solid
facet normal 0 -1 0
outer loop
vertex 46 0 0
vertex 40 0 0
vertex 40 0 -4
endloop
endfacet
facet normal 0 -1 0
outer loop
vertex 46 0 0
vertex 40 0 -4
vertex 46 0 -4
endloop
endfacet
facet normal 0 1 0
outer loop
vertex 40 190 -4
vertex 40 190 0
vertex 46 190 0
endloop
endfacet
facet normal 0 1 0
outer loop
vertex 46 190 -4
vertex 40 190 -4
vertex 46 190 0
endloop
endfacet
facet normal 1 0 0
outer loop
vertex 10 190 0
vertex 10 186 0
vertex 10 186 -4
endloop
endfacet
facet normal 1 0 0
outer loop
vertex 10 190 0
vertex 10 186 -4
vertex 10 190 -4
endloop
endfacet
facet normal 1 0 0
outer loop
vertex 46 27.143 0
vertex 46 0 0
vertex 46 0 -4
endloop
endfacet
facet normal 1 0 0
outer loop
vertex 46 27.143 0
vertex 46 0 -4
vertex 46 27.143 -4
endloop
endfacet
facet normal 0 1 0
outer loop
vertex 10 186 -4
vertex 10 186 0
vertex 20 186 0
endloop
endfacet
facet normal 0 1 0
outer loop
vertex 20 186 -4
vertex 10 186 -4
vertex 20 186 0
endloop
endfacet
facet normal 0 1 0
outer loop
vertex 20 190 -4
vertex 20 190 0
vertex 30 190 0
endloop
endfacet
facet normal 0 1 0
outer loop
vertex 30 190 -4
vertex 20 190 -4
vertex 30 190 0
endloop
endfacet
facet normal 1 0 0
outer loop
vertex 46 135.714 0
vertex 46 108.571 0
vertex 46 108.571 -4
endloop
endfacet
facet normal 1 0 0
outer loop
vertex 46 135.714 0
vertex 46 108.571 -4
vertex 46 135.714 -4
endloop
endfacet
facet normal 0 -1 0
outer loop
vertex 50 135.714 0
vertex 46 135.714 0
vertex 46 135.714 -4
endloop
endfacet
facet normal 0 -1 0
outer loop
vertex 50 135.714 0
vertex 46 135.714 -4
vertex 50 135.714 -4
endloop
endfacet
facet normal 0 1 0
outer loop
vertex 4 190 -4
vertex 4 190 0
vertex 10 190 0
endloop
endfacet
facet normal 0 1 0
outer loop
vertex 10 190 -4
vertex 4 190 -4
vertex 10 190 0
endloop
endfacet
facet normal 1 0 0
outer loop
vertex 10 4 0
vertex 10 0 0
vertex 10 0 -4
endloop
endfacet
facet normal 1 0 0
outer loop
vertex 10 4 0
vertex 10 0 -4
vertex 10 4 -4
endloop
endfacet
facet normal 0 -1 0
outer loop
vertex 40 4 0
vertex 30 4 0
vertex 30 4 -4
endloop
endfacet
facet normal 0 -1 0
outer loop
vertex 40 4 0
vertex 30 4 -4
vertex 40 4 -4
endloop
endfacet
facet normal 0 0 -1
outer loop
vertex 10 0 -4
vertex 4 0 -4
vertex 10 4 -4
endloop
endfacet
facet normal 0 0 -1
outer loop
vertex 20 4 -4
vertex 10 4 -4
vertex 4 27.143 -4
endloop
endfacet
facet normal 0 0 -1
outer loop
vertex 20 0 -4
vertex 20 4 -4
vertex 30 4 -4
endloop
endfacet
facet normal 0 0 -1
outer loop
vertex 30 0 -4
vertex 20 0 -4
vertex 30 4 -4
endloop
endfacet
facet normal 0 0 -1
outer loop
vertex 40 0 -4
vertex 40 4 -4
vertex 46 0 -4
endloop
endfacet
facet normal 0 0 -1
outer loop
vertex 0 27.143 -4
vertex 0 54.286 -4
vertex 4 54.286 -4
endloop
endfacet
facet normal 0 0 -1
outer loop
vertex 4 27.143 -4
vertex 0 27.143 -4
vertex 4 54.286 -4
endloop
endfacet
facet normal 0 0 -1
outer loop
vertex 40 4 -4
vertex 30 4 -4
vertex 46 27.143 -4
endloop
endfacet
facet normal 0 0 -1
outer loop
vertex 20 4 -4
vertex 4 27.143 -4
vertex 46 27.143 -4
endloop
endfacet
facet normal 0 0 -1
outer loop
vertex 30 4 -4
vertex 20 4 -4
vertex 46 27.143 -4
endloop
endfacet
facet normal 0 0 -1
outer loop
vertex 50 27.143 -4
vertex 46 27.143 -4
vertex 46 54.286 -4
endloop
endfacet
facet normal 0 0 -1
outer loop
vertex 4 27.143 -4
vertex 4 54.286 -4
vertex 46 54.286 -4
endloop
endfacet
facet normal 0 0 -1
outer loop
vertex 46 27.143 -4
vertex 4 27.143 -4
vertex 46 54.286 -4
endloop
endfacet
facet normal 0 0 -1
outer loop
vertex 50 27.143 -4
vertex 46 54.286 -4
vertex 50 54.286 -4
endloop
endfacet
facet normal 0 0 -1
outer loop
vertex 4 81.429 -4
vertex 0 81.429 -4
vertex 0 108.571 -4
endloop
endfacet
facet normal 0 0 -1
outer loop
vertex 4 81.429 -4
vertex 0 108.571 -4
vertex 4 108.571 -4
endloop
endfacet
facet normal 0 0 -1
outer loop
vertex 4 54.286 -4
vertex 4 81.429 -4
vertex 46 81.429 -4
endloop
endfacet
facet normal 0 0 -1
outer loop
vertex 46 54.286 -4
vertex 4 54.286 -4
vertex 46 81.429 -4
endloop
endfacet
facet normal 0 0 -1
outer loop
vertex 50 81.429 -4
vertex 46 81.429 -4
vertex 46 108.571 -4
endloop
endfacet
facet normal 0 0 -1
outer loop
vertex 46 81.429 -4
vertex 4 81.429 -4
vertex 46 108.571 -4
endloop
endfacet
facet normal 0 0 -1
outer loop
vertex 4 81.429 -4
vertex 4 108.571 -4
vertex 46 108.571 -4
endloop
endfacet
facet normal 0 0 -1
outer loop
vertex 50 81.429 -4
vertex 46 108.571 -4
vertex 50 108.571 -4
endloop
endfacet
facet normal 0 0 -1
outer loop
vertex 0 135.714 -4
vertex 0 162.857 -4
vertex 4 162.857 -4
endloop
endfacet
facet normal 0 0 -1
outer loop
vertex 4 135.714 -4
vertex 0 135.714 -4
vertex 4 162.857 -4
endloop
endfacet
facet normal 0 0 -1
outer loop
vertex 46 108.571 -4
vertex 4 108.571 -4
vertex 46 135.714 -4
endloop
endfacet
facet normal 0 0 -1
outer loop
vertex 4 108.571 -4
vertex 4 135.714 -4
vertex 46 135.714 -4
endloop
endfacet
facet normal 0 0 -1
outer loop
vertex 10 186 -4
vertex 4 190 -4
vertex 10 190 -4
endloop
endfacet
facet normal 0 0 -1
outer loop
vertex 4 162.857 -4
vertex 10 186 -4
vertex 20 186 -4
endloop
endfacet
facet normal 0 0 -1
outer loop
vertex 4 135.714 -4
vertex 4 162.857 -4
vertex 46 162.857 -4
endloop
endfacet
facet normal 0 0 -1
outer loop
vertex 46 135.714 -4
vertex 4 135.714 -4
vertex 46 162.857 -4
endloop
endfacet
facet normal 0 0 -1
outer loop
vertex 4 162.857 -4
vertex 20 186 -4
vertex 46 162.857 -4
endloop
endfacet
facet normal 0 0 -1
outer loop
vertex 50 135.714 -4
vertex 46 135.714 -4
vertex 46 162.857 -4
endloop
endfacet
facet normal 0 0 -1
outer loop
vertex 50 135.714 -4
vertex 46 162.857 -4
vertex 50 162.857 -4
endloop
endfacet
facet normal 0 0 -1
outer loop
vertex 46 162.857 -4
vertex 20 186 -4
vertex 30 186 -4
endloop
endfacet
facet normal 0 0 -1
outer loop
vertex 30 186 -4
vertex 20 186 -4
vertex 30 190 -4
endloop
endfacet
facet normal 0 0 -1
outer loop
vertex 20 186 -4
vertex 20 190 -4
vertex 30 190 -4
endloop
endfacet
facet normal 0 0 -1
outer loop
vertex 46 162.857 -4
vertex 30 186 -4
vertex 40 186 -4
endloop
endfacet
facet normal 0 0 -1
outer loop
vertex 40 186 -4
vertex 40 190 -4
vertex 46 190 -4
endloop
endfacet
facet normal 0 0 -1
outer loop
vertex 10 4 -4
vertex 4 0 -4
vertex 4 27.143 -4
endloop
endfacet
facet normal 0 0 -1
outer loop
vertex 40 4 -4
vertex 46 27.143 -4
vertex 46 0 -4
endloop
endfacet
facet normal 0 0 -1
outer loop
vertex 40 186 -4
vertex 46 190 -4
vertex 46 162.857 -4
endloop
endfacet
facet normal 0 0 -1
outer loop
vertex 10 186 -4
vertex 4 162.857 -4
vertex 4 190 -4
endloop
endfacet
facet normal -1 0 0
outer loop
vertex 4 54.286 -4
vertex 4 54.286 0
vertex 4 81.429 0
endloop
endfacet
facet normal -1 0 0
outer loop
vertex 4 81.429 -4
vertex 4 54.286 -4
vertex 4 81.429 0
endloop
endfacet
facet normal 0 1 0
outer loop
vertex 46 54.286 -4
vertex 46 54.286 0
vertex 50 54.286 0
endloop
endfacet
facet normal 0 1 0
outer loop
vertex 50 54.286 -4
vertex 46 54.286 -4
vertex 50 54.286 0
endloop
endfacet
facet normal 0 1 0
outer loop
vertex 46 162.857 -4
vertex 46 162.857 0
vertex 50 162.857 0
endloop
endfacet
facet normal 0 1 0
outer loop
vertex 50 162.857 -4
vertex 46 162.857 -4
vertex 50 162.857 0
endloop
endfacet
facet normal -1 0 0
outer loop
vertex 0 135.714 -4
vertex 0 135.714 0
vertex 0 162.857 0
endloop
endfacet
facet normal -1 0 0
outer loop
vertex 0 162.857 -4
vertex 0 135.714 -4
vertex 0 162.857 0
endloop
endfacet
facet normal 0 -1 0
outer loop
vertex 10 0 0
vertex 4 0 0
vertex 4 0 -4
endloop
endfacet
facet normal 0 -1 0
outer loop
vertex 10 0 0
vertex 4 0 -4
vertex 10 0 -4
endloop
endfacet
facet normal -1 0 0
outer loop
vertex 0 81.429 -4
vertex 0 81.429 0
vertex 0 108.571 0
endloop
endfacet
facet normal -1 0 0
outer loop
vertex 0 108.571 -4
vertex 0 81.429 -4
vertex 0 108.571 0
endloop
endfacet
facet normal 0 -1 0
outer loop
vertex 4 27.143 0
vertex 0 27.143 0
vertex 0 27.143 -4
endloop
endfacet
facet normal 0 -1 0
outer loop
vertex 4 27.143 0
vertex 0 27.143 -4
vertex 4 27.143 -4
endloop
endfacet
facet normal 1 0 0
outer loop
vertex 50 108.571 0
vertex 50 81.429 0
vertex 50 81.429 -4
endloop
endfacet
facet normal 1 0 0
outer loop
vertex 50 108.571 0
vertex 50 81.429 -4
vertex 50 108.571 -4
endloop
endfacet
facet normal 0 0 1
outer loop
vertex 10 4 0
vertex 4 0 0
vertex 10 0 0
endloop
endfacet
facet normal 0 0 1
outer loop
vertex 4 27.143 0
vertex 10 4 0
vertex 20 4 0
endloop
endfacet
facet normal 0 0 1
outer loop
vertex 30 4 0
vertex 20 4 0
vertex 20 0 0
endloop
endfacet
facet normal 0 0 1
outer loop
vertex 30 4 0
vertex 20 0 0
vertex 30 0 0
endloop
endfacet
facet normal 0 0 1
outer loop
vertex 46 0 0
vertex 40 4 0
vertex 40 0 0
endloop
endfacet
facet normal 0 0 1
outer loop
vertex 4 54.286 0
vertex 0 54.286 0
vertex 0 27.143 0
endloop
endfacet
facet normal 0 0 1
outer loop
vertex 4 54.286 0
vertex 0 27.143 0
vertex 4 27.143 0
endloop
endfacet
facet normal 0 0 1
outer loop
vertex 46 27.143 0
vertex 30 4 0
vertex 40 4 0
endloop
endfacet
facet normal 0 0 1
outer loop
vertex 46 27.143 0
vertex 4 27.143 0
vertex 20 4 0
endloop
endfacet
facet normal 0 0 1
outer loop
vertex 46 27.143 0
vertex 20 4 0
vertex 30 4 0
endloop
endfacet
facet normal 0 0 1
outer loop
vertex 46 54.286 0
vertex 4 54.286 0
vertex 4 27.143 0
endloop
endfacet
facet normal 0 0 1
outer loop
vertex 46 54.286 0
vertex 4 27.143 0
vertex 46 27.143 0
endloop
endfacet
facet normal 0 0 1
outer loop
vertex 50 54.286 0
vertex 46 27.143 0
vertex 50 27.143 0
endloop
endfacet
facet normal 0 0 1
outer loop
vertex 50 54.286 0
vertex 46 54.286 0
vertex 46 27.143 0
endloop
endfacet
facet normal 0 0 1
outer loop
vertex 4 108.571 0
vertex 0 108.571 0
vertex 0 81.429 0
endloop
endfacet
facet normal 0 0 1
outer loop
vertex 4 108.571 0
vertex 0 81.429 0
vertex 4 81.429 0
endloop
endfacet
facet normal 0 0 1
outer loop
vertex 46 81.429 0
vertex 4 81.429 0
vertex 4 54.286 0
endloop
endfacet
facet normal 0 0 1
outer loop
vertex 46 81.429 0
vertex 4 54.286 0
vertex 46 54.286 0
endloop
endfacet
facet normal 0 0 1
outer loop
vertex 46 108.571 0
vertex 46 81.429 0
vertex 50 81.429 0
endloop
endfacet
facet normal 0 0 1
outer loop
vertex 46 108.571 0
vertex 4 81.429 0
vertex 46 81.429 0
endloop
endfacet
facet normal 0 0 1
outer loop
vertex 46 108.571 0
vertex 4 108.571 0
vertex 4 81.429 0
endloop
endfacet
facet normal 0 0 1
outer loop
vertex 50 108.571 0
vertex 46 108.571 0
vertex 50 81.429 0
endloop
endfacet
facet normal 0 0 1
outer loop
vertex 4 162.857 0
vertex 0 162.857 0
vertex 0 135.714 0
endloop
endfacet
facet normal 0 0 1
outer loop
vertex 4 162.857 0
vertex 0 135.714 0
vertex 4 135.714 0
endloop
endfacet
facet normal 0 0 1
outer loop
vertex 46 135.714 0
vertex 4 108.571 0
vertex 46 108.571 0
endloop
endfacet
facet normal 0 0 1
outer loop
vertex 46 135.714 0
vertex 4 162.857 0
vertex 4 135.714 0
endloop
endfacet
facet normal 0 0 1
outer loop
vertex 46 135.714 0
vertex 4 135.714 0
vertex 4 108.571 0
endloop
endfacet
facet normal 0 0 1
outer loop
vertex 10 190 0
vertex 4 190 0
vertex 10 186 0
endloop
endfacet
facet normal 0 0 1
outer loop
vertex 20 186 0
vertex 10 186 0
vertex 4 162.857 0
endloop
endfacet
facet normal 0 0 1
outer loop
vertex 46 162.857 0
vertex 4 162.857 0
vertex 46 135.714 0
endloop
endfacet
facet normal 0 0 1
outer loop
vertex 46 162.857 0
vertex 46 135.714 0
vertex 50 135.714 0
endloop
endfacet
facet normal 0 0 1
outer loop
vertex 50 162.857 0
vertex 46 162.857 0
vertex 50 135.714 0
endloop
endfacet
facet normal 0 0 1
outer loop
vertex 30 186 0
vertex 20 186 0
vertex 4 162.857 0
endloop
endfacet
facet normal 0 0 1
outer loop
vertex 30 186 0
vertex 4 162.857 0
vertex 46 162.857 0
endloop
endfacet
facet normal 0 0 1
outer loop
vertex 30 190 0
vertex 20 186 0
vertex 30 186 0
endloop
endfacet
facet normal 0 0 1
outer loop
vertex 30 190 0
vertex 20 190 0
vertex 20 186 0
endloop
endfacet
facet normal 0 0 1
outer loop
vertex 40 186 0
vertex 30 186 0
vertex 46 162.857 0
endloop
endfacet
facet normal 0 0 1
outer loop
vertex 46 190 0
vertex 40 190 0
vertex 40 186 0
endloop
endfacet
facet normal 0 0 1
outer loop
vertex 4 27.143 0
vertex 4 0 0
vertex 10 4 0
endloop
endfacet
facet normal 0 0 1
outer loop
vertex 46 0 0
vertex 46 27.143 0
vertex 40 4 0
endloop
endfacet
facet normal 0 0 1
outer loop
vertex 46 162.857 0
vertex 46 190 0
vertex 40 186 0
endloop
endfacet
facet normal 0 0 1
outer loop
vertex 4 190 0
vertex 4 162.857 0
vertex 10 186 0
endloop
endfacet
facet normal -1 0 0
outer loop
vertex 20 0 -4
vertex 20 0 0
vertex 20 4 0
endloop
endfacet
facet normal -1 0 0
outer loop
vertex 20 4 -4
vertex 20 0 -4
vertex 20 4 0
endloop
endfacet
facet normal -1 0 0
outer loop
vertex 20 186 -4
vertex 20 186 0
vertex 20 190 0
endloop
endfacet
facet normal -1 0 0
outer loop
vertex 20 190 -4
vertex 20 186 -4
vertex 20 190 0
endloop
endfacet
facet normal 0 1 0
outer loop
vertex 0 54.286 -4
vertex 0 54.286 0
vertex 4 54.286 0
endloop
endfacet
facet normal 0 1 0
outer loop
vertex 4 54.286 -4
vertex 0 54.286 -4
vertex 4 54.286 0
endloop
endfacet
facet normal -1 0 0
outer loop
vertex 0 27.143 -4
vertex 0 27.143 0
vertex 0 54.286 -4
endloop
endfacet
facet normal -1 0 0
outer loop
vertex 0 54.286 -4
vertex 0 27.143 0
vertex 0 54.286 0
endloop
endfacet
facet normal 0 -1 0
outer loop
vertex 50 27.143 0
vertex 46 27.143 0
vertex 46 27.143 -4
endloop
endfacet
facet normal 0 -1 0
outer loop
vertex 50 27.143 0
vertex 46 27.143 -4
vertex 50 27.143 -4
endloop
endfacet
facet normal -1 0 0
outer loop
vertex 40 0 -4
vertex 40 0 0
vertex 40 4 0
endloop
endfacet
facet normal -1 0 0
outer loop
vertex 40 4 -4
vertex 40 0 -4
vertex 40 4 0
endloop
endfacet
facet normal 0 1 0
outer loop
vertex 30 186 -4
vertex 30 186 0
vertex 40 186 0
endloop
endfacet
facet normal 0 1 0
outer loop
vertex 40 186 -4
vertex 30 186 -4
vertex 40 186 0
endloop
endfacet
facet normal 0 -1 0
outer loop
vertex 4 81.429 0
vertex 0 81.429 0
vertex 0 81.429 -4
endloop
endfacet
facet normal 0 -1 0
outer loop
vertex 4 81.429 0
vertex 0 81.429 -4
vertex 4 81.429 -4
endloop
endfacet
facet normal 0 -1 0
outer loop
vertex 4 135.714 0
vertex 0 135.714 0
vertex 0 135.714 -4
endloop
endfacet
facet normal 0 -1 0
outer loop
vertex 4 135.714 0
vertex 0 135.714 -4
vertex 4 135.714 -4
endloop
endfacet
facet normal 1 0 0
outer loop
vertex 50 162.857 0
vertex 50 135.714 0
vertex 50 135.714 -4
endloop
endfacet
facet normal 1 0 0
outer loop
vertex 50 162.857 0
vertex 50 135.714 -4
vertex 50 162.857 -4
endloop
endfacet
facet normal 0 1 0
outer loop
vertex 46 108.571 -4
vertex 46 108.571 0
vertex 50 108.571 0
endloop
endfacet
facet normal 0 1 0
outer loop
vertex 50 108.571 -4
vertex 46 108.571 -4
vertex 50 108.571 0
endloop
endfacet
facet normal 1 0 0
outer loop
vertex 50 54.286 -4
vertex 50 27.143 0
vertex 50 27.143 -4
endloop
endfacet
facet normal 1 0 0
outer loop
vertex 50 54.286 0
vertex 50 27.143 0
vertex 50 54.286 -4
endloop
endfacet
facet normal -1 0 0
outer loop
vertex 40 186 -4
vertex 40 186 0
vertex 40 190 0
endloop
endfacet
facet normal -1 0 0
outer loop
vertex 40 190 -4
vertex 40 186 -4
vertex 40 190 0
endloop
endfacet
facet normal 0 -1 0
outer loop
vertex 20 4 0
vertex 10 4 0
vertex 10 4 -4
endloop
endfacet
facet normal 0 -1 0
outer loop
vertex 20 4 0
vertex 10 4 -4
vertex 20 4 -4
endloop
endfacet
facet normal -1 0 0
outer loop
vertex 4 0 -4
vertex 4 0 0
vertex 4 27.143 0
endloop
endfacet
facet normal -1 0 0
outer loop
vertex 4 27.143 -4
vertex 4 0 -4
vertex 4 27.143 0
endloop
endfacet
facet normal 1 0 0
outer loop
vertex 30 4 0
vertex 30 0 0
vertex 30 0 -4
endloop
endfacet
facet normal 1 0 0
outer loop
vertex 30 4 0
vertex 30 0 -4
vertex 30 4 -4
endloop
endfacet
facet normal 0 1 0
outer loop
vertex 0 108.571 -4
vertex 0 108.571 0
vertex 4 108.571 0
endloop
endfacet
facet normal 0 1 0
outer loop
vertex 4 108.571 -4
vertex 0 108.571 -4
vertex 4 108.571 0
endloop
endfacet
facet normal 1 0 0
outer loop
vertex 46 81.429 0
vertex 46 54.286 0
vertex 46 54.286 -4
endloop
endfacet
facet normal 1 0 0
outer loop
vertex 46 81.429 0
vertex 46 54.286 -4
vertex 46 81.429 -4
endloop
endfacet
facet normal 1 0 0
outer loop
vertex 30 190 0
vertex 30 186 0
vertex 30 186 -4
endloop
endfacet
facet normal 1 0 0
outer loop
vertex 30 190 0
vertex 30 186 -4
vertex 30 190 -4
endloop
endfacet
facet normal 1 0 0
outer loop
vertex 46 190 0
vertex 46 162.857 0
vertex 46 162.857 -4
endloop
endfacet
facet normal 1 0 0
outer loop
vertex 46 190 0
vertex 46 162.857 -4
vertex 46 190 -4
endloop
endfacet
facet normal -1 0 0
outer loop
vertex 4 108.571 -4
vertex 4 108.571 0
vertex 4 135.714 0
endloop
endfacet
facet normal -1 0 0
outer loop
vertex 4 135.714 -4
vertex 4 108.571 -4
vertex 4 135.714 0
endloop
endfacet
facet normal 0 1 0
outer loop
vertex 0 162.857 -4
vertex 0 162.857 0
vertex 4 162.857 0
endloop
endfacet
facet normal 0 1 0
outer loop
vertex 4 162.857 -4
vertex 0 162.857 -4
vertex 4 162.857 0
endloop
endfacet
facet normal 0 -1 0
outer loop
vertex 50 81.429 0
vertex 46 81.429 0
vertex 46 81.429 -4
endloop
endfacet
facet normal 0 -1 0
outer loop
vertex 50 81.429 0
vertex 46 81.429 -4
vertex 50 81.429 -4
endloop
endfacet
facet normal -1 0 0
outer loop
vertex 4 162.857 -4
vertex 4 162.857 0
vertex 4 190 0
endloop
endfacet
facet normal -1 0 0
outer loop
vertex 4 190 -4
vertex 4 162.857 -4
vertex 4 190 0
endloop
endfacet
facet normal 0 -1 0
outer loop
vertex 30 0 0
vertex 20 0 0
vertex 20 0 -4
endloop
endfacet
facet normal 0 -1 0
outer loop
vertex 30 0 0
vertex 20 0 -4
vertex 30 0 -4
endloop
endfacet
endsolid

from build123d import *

# Parameters (mm, degrees)
BUITENAFMETING_RECHTHOEK_W  = 50
BUITENAFMETING_RECHTHOEK_H  = 190
PLAAT_DEPTH                 = 4
TAND_HOR_W                  = 10
TAND_HOR_H                  = 4
TAND_BOVEN_DEPTH            = 5
TANDEN_PATROON_BOVEN_COUNT  = 2
TANDEN_PATROON_BOVEN_PITCH  = 20
TAND_VER_W                  = 4
TAND_VER_H                  = 27.142857143
TAND_LINKS_DEPTH            = 5
TANDEN_PATROON_LINKS_COUNT  = 4
TANDEN_PATROON_LINKS_PITCH  = 54.285714286
TAND_O_W                    = 10
TAND_O_H                    = 4
TAND_ONDER_DEPTH            = 5
TANDEN_PATROON_ONDER_COUNT  = 2
TANDEN_PATROON_ONDER_PITCH  = 20
TAND_R_W                    = 4
TAND_R_H                    = 27.142857143
TAND_RECHTS_DEPTH           = 5
TANDEN_PATROON_RECHTS_COUNT = 4
TANDEN_PATROON_RECHTS_PITCH = 54.285714286


with BuildPart() as part:
    # Buitenafmeting Rechthoek → Plaat (new body)
    with BuildSketch(Plane.XY):
        with Locations((25, 95)):
            Rectangle(BUITENAFMETING_RECHTHOEK_W, BUITENAFMETING_RECHTHOEK_H)
    extrude(amount=-PLAAT_DEPTH)

    # Tand Hor → Tand Boven (cut, through all)
    with BuildSketch(Plane.XY):
        with Locations((15, 188)):
            Rectangle(TAND_HOR_W, TAND_HOR_H)
    tand_boven = extrude(amount=-TAND_BOVEN_DEPTH, mode=Mode.SUBTRACT)

    # Tanden Patroon Boven: Tand Boven ×2
    with Locations(*[(i * TANDEN_PATROON_BOVEN_PITCH, 0, 0) for i in range(1, TANDEN_PATROON_BOVEN_COUNT)]):
        add(tand_boven, mode=Mode.SUBTRACT)

    # Tand Ver → Tand Links (cut, through all)
    with BuildSketch(Plane.XY):
        with Locations((2, 176.428571428)):
            Rectangle(TAND_VER_W, TAND_VER_H)
    tand_links = extrude(amount=-TAND_LINKS_DEPTH, mode=Mode.SUBTRACT)

    # Tanden Patroon Links: Tand Links ×4
    with Locations(*[(0, -i * TANDEN_PATROON_LINKS_PITCH, 0) for i in range(1, TANDEN_PATROON_LINKS_COUNT)]):
        add(tand_links, mode=Mode.SUBTRACT)

    # Tand O → Tand Onder (cut, through all)
    with BuildSketch(Plane.XY):
        with Locations((15, 2)):
            Rectangle(TAND_O_W, TAND_O_H)
    tand_onder = extrude(amount=-TAND_ONDER_DEPTH, mode=Mode.SUBTRACT)

    # Tanden Patroon Onder: Tand Onder ×2
    with Locations(*[(i * TANDEN_PATROON_ONDER_PITCH, 0, 0) for i in range(1, TANDEN_PATROON_ONDER_COUNT)]):
        add(tand_onder, mode=Mode.SUBTRACT)

    # Tand R → Tand Rechts (cut, through all)
    with BuildSketch(Plane.XY):
        with Locations((48, 176.428571428)):
            Rectangle(TAND_R_W, TAND_R_H)
    tand_rechts = extrude(amount=-TAND_RECHTS_DEPTH, mode=Mode.SUBTRACT)

    # Tanden Patroon Rechts: Tand Rechts ×4
    with Locations(*[(0, -i * TANDEN_PATROON_RECHTS_PITCH, 0) for i in range(1, TANDEN_PATROON_RECHTS_COUNT)]):
        add(tand_rechts, mode=Mode.SUBTRACT)


solid = part.part
